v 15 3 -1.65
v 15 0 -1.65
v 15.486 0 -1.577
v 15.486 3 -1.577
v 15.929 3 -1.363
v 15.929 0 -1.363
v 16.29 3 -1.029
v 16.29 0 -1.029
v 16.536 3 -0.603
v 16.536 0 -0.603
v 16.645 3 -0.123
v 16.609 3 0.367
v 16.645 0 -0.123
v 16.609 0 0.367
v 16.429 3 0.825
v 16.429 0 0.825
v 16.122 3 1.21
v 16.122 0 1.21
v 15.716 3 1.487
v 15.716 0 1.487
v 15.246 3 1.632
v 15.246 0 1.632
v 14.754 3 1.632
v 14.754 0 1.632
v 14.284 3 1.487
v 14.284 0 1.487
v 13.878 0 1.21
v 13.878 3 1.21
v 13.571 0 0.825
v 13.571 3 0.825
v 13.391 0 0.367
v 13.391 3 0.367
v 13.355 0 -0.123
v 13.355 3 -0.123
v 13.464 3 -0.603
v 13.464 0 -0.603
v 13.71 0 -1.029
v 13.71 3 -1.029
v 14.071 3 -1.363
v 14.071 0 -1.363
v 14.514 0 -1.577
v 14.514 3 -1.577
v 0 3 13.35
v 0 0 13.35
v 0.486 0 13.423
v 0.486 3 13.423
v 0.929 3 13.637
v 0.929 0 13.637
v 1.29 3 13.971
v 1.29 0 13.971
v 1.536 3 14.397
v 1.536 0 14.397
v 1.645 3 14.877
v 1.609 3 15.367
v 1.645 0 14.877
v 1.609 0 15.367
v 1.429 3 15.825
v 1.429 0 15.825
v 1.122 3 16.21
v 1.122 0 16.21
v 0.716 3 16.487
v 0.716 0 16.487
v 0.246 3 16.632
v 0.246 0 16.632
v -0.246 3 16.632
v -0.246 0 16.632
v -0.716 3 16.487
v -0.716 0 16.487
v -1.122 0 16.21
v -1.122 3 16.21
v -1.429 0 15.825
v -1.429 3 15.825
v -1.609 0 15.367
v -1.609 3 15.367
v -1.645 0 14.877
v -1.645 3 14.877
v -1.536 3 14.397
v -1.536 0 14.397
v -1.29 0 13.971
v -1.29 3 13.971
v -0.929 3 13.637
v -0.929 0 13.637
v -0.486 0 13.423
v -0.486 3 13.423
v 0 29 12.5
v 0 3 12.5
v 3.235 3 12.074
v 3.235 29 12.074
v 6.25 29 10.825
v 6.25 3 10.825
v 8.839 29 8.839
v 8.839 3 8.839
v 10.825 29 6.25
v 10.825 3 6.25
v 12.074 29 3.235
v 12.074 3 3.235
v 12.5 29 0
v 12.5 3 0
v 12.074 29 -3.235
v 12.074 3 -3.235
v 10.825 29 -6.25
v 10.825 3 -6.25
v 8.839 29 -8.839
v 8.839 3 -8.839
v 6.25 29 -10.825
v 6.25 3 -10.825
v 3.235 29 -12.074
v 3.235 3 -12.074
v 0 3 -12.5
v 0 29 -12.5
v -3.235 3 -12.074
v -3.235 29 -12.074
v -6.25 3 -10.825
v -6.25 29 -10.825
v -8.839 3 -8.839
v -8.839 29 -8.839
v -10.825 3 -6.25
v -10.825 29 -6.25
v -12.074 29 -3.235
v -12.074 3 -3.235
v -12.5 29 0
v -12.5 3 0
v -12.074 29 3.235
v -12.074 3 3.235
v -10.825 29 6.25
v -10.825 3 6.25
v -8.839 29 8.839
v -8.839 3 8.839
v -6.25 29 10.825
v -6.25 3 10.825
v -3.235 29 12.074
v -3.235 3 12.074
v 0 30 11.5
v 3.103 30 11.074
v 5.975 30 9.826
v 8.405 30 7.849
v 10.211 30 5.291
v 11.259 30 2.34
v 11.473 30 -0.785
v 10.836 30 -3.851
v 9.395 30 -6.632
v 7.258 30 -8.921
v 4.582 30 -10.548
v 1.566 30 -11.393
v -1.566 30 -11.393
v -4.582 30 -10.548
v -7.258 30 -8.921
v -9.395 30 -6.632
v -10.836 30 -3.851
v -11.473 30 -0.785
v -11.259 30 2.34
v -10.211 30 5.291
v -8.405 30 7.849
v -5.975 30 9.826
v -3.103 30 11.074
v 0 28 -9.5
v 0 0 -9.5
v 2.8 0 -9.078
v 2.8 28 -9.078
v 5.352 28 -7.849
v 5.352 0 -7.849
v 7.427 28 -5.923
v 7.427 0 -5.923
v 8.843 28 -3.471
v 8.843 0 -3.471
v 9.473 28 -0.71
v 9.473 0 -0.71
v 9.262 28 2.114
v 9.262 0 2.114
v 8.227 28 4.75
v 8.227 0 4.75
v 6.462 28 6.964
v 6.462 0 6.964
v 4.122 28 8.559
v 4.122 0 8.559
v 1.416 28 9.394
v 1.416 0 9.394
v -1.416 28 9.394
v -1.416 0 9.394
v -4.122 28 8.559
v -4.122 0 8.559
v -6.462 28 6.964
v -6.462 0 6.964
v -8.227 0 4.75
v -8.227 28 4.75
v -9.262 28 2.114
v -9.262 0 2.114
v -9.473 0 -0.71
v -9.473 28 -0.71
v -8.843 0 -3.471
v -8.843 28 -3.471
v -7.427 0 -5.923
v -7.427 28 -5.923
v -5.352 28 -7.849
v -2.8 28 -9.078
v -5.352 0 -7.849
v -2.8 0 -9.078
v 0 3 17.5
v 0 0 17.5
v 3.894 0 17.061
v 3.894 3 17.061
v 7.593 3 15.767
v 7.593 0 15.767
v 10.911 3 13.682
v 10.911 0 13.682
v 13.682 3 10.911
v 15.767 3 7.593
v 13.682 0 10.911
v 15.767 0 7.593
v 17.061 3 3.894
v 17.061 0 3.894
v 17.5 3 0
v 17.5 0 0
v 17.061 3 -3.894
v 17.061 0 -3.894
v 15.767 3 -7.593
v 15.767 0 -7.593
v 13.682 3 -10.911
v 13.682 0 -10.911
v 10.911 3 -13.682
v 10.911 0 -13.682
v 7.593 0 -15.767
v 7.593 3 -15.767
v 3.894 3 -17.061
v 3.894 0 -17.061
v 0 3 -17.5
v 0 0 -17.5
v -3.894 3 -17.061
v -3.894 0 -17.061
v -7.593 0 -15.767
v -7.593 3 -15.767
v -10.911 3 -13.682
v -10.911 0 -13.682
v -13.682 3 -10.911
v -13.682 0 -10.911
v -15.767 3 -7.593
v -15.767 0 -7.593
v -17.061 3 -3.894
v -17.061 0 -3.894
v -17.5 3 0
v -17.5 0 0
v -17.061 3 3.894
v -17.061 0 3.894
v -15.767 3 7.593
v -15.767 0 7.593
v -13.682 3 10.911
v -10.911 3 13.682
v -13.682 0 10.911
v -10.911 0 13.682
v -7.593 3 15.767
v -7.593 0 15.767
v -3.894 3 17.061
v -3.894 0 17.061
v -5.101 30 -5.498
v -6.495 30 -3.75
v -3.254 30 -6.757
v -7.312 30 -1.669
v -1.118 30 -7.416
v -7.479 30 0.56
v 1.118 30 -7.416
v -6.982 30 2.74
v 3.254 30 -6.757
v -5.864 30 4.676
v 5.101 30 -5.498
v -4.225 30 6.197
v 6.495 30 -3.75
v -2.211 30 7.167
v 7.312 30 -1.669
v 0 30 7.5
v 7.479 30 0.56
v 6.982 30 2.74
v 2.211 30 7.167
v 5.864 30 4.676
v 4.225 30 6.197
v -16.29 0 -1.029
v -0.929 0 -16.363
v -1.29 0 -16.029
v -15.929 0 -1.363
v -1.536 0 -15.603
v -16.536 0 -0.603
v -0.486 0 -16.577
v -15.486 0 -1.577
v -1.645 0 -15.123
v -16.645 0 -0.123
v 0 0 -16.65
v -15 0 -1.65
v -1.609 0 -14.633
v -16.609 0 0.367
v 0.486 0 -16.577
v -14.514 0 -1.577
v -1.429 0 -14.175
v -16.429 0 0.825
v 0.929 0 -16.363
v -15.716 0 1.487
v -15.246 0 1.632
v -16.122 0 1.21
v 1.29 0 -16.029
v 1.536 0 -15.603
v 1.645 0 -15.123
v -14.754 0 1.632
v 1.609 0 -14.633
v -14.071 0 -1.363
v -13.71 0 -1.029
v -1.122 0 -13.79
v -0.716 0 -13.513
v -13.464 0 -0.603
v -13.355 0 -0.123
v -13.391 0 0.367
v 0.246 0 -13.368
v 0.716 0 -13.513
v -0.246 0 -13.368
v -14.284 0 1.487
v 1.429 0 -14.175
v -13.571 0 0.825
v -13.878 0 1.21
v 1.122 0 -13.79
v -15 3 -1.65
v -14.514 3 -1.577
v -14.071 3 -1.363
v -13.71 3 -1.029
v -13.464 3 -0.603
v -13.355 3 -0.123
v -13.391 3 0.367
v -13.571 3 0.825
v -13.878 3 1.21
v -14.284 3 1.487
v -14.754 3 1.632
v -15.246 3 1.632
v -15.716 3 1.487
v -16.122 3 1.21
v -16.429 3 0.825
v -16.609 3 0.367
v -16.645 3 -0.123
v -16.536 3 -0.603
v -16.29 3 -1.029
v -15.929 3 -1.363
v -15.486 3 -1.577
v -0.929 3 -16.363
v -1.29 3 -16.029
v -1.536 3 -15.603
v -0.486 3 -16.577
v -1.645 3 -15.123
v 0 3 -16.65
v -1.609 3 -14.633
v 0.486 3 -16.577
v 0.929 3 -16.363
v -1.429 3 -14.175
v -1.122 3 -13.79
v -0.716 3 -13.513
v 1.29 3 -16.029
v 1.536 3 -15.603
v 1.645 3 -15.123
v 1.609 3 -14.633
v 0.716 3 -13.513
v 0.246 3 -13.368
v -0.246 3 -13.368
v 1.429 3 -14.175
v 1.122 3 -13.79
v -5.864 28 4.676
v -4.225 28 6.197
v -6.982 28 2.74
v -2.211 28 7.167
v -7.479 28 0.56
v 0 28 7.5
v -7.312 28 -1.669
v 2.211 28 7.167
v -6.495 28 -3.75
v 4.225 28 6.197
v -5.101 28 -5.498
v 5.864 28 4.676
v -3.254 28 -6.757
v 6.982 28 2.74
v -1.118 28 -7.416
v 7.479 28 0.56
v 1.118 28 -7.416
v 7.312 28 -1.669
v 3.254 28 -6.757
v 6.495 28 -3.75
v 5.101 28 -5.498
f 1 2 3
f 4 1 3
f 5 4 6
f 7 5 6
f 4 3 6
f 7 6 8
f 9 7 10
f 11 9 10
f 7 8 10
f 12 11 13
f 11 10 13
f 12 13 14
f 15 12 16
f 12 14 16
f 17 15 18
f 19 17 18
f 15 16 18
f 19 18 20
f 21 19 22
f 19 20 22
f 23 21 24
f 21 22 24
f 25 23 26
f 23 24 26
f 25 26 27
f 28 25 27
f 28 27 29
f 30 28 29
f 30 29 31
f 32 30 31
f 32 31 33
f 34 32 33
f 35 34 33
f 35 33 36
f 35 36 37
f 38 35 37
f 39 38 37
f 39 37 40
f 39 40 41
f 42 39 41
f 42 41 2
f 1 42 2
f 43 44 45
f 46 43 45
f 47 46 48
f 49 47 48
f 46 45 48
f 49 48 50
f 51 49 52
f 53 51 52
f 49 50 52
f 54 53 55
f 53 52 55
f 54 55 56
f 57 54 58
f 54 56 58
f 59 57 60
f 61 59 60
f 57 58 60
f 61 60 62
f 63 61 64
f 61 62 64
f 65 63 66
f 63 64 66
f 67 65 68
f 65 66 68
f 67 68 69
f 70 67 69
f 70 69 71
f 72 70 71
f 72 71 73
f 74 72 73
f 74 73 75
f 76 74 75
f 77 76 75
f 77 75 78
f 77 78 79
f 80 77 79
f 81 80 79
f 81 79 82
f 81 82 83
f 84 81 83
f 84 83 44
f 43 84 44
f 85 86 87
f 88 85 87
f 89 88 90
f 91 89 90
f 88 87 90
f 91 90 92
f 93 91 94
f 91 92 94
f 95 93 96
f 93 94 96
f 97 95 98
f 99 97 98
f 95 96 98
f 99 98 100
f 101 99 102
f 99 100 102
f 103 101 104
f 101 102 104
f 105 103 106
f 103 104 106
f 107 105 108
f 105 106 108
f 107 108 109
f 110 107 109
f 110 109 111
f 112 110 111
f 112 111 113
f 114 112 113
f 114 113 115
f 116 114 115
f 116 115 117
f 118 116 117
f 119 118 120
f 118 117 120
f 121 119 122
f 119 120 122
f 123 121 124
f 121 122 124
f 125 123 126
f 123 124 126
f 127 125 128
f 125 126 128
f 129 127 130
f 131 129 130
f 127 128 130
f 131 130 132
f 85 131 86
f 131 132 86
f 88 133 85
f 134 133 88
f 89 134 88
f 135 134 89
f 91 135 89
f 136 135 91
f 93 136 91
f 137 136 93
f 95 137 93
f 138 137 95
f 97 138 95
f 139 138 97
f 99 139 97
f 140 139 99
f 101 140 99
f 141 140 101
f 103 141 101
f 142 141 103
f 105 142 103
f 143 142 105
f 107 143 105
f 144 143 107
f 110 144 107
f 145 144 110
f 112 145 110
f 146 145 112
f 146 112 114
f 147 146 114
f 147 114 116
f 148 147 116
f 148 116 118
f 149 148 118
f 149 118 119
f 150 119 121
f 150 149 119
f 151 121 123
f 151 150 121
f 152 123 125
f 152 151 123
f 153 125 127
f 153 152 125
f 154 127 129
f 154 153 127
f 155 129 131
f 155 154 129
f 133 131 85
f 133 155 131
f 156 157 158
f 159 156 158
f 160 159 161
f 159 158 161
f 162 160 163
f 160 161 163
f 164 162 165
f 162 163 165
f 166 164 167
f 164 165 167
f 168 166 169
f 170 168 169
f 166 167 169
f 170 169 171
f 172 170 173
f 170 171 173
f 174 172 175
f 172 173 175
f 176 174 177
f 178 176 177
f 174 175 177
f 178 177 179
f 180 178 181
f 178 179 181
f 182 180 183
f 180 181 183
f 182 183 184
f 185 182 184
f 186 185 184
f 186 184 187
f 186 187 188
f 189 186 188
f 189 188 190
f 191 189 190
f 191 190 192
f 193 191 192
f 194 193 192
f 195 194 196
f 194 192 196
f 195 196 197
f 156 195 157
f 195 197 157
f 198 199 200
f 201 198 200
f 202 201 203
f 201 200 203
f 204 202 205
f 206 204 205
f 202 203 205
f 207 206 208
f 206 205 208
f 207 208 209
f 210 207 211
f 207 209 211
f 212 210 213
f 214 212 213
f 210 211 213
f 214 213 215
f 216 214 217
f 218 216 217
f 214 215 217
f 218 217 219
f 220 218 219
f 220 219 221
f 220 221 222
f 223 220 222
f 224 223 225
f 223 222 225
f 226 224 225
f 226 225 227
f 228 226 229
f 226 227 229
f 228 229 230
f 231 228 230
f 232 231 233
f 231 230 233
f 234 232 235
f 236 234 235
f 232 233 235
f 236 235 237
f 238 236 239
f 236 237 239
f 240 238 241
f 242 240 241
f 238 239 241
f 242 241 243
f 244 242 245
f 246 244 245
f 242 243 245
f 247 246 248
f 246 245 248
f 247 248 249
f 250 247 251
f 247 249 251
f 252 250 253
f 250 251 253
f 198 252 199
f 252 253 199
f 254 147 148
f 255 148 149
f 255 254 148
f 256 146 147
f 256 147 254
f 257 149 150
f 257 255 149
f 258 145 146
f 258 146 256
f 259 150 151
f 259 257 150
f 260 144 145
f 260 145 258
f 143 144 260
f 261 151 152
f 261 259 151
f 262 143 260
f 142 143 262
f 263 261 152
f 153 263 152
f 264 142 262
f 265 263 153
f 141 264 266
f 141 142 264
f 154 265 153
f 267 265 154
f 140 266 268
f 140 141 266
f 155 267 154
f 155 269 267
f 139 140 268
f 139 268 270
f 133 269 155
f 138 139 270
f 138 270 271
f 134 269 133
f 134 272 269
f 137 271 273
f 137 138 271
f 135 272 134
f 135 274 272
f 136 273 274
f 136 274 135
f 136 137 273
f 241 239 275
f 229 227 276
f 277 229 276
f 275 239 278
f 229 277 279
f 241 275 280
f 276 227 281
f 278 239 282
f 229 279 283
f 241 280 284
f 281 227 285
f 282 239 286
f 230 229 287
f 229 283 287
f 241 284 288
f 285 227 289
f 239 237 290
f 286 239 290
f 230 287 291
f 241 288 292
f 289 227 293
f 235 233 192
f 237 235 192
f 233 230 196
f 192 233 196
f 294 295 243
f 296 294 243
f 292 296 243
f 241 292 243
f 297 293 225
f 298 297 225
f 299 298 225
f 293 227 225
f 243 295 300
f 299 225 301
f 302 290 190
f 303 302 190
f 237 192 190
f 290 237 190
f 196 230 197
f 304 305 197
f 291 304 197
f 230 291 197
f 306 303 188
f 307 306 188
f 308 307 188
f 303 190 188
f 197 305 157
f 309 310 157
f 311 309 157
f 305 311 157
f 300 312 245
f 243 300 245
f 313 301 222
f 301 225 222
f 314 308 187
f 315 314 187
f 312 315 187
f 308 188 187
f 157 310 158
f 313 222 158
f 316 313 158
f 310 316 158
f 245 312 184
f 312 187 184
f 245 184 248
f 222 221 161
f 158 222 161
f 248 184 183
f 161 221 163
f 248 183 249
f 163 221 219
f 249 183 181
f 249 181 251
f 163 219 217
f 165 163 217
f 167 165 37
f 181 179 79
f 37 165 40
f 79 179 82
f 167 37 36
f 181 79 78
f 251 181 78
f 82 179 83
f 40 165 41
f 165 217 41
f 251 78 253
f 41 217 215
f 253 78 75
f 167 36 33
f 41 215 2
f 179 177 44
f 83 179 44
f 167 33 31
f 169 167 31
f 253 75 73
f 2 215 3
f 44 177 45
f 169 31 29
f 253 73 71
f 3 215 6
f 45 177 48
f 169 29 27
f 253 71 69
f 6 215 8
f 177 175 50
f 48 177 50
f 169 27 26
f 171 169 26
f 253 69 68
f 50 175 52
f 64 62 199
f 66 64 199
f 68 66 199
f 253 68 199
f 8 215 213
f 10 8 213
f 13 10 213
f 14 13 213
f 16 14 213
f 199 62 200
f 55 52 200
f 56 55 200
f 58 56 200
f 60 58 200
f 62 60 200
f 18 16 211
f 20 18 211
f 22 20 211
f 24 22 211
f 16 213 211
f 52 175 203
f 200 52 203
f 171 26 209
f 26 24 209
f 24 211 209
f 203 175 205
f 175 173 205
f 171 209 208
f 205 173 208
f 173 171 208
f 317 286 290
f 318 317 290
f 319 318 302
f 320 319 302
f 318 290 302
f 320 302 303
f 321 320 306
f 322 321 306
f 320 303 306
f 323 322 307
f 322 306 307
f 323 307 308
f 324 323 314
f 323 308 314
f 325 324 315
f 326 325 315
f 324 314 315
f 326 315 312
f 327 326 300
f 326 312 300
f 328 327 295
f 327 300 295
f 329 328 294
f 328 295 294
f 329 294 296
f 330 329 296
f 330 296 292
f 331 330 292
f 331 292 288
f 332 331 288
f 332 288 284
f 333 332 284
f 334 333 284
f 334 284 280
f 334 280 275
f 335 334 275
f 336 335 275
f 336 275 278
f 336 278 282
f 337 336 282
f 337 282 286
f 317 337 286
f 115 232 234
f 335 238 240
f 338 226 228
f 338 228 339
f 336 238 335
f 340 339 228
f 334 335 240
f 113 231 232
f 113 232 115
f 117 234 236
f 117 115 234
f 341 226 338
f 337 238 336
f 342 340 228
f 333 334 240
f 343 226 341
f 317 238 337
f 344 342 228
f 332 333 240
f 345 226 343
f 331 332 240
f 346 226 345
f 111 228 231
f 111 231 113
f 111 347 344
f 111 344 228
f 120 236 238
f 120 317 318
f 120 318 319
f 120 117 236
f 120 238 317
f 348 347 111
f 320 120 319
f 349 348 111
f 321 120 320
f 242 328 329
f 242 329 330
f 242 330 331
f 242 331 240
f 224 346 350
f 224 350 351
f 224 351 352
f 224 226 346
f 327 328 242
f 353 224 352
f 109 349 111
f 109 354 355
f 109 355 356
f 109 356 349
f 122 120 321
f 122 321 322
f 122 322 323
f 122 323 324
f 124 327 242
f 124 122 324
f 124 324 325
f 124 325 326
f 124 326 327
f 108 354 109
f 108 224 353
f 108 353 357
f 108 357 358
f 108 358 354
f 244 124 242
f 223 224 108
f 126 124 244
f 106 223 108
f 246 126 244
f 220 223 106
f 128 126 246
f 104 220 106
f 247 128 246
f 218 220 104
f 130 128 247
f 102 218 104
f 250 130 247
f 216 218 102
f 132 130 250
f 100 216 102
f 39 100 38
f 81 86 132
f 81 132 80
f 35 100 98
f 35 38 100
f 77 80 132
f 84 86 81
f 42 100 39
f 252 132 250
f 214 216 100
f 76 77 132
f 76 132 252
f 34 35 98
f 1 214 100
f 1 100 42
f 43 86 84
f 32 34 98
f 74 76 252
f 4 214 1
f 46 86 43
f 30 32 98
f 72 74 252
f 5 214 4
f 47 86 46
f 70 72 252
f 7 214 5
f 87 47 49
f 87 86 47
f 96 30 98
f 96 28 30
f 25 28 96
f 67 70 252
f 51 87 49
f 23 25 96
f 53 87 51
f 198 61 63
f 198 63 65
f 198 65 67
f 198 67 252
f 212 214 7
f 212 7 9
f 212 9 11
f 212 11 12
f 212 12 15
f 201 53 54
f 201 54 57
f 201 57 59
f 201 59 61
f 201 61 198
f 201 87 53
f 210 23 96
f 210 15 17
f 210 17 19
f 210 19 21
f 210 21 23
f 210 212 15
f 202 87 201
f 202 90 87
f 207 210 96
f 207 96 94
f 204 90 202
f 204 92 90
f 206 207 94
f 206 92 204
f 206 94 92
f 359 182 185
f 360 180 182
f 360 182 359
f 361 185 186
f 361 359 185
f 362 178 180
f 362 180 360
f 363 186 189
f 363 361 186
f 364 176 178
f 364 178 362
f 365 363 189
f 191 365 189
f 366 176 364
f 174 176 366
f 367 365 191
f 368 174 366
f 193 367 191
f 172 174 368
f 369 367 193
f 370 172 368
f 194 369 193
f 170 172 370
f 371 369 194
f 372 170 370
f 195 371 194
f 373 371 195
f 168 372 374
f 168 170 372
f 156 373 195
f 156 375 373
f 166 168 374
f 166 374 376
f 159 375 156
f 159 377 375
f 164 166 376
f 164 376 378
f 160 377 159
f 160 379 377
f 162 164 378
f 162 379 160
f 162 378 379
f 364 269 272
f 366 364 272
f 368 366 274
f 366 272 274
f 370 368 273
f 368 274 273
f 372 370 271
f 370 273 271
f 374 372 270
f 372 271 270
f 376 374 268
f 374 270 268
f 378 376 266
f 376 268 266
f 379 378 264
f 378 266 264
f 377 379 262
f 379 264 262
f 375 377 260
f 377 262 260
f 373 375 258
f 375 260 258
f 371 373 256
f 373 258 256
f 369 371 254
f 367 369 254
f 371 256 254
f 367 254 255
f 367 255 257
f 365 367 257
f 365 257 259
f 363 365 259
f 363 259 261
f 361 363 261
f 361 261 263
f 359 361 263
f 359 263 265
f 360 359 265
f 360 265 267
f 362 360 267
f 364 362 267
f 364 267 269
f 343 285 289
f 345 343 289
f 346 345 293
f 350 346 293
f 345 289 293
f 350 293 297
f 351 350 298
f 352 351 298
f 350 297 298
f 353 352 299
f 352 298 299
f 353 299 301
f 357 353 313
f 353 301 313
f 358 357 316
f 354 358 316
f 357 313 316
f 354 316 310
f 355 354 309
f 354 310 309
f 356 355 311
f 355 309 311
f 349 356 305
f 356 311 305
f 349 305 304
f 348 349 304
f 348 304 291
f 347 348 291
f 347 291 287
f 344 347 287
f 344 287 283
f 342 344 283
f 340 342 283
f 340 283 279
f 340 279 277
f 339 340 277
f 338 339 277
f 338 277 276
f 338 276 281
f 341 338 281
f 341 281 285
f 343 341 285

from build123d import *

# Parameters (mm, degrees)
SKETCH_1_R          = 17.5
EXTRUDE_1_DEPTH     = 3
SKETCH_2_R          = 12.5
EXTRUDE_2_DEPTH     = 27
SKETCH_4_R          = 9.5
CUT_EXTRUDE_1_DEPTH = 28
SKETCH_5_R          = 7.5
CUT_EXTRUDE_2_DEPTH = 28
CHAMFER_1_SIZE      = 1
SKETCH_6_R          = 1.65
CUT_EXTRUDE_3_DEPTH = 10


with BuildPart() as part:
    # Эскиз1 → Бобышка-Вытянуть1 (new body)
    with BuildSketch(Plane(origin=(0, 0, 0), x_dir=(1, 0, 0), z_dir=(0, 1, 0))):
        with Locations(Location((0, 0, 0), (0, 0, 270))):
            Circle(SKETCH_1_R)
    extrude(amount=EXTRUDE_1_DEPTH)

    # Эскиз2 → Бобышка-Вытянуть2 (add)
    with BuildSketch(Plane(origin=(0, 3, 0), x_dir=(1, 0, 0), z_dir=(0, 1, 0))):
        with Locations(Location((0, 0, 0), (0, 0, 270))):
            Circle(SKETCH_2_R)
    extrude(amount=EXTRUDE_2_DEPTH)

    # Эскиз4 → Вырез-Вытянуть1 (cut)
    with BuildSketch(Plane.XZ):
        with Locations(Location((0, 0, 0), (0, 0, 270))):
            Circle(SKETCH_4_R)
    extrude(amount=-CUT_EXTRUDE_1_DEPTH, mode=Mode.SUBTRACT)

    # Эскиз5 → Вырез-Вытянуть2 (cut)
    with BuildSketch(Plane(origin=(0, 30, 0), x_dir=(1, 0, 0), z_dir=(0, 1, 0))):
        with Locations(Location((0, 0, 0), (0, 0, 270))):
            Circle(SKETCH_5_R)
    extrude(amount=-CUT_EXTRUDE_2_DEPTH, mode=Mode.SUBTRACT)

    # Фаска1
    chamfer_1_edges = [part.edges().sort_by_distance(p)[0] for p in [
        (0, 30, -12.5),
    ]]
    chamfer(chamfer_1_edges, length=CHAMFER_1_SIZE)

    # Эскиз6 → Вырез-Вытянуть3 (cut)
    with BuildSketch(Plane.XZ):
        with Locations(Location((0, 15, 0), (0, 0, 270))):
            Circle(SKETCH_6_R)
        with Locations(Location((-15, 0, 0), (0, 0, 270))):
            Circle(SKETCH_6_R)
        with Locations(Location((0, -15, 0), (0, 0, 270))):
            Circle(SKETCH_6_R)
        with Locations(Location((15, 0, 0), (0, 0, 270))):
            Circle(SKETCH_6_R)
    extrude(amount=-CUT_EXTRUDE_3_DEPTH, mode=Mode.SUBTRACT)


solid = part.part
